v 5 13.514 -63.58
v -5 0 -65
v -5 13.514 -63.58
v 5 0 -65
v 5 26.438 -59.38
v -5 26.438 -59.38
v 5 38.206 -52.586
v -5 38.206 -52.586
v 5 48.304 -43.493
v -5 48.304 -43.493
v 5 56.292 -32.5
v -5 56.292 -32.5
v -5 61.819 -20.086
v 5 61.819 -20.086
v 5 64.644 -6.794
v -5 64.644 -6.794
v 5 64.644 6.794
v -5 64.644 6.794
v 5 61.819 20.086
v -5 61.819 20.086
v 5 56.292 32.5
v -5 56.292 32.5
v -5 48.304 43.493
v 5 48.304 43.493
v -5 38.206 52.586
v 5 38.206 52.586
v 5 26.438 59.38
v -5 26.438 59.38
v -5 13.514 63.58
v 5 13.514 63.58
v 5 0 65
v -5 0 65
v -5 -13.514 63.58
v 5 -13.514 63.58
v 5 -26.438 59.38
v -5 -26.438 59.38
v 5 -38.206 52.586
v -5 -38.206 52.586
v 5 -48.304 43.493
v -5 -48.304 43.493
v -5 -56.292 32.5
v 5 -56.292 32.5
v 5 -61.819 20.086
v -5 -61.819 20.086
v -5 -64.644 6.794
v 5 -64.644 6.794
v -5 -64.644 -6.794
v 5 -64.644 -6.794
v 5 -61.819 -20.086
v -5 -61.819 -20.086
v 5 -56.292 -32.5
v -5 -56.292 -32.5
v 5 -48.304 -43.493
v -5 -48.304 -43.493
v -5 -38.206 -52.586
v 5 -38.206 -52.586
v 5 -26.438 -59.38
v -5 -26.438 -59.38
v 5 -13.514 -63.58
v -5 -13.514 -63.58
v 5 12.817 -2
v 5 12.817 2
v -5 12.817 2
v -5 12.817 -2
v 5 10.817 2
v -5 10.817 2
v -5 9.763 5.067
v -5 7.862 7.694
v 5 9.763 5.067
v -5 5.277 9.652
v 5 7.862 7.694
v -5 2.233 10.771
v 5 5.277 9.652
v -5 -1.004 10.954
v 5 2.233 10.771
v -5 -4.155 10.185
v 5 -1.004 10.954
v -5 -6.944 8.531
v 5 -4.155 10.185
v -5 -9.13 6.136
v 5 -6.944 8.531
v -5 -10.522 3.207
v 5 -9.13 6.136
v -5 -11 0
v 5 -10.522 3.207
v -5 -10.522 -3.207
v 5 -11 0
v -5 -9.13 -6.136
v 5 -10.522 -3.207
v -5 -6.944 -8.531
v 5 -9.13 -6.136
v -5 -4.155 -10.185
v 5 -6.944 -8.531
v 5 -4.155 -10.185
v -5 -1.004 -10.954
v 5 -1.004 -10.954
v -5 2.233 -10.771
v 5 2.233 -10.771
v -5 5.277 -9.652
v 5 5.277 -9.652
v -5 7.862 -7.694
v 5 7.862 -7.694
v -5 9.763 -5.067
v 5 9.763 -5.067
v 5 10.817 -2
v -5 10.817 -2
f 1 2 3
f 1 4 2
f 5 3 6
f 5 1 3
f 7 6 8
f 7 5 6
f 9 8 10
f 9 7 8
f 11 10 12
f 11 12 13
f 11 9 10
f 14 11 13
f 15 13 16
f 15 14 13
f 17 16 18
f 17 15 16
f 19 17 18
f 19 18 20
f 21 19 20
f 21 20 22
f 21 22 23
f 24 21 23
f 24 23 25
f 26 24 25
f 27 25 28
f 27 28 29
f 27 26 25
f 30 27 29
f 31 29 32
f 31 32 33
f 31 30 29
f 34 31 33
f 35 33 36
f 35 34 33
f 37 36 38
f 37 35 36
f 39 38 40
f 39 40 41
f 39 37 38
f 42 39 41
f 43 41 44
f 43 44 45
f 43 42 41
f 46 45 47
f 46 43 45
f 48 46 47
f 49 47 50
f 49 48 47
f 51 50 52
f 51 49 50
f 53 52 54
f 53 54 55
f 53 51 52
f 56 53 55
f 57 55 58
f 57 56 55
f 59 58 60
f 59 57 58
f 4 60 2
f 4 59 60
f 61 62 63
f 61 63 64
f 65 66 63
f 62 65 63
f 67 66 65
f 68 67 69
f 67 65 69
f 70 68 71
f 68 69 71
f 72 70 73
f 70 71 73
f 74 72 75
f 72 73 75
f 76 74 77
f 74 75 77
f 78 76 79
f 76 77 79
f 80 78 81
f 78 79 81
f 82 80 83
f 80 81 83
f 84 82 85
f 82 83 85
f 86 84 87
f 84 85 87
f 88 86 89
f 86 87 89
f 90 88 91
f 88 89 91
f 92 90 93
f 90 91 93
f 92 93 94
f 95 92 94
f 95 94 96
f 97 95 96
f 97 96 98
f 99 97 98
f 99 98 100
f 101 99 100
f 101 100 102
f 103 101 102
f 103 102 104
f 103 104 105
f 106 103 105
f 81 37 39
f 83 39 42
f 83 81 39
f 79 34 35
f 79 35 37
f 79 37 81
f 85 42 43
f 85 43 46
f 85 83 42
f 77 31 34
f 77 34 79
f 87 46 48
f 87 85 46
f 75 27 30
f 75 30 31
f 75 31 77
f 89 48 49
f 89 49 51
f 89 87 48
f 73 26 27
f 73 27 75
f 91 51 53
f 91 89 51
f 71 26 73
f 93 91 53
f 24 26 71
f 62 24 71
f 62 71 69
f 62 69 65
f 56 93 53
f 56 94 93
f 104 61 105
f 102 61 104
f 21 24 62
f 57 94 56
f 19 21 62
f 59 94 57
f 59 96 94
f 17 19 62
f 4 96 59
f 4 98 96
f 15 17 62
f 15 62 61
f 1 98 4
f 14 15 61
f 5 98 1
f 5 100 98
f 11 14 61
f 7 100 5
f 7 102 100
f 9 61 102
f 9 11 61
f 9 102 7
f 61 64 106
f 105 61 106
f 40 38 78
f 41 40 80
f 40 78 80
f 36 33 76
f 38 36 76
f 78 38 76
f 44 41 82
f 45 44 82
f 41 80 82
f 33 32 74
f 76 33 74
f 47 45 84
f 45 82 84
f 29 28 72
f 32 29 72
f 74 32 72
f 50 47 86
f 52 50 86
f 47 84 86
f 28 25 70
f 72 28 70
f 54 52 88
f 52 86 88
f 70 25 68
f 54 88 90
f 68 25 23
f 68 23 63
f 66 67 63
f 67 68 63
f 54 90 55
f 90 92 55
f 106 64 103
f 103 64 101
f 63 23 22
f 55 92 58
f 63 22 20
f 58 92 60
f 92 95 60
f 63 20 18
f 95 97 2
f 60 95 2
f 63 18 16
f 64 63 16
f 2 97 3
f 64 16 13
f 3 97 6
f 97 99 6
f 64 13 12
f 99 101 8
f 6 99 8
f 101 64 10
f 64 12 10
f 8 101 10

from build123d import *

# Parameters (mm, degrees)
SKETCH1_R           = 65
BOSS_EXTRUDE1_DEPTH = 5
SKETCH3_R           = 11
CUT_EXTRUDE2_DEPTH  = 93.466210045
CUT_EXTRUDE5_DEPTH  = 93.466210045


with BuildPart() as part:
    # Sketch1 → Boss-Extrude1 (new, symmetric)
    with BuildSketch(Plane(origin=(0, 0, 0), x_dir=(0, 0, -1), z_dir=(1, 0, 0))):
        Circle(SKETCH1_R)
    extrude(amount=BOSS_EXTRUDE1_DEPTH, both=True)

    # Sketch3 → Cut-Extrude2 (cut, through all)
    with BuildSketch(Plane(origin=(5, 0, 0), x_dir=(0, 0, -1), z_dir=(1, 0, 0))):
        Circle(SKETCH3_R)
    extrude(amount=-CUT_EXTRUDE2_DEPTH, mode=Mode.SUBTRACT)

    # Sketch5 → Cut-Extrude5 (cut, through all)
    with BuildSketch(Plane(origin=(5, 0, 0), x_dir=(0, 0, -1), z_dir=(1, 0, 0))):
        with BuildLine():
            Line((-2, 10.816653826), (-2, 12.816653826))
            Line((-2, 12.816653826), (2, 12.816653826))
            Line((2, 12.816653826), (2, 10.816653826))
            ThreePointArc((2, 10.816653826), (0, 11), (-2, 10.816653826))
        make_face()
    extrude(amount=-CUT_EXTRUDE5_DEPTH, mode=Mode.SUBTRACT)


solid = part.part
